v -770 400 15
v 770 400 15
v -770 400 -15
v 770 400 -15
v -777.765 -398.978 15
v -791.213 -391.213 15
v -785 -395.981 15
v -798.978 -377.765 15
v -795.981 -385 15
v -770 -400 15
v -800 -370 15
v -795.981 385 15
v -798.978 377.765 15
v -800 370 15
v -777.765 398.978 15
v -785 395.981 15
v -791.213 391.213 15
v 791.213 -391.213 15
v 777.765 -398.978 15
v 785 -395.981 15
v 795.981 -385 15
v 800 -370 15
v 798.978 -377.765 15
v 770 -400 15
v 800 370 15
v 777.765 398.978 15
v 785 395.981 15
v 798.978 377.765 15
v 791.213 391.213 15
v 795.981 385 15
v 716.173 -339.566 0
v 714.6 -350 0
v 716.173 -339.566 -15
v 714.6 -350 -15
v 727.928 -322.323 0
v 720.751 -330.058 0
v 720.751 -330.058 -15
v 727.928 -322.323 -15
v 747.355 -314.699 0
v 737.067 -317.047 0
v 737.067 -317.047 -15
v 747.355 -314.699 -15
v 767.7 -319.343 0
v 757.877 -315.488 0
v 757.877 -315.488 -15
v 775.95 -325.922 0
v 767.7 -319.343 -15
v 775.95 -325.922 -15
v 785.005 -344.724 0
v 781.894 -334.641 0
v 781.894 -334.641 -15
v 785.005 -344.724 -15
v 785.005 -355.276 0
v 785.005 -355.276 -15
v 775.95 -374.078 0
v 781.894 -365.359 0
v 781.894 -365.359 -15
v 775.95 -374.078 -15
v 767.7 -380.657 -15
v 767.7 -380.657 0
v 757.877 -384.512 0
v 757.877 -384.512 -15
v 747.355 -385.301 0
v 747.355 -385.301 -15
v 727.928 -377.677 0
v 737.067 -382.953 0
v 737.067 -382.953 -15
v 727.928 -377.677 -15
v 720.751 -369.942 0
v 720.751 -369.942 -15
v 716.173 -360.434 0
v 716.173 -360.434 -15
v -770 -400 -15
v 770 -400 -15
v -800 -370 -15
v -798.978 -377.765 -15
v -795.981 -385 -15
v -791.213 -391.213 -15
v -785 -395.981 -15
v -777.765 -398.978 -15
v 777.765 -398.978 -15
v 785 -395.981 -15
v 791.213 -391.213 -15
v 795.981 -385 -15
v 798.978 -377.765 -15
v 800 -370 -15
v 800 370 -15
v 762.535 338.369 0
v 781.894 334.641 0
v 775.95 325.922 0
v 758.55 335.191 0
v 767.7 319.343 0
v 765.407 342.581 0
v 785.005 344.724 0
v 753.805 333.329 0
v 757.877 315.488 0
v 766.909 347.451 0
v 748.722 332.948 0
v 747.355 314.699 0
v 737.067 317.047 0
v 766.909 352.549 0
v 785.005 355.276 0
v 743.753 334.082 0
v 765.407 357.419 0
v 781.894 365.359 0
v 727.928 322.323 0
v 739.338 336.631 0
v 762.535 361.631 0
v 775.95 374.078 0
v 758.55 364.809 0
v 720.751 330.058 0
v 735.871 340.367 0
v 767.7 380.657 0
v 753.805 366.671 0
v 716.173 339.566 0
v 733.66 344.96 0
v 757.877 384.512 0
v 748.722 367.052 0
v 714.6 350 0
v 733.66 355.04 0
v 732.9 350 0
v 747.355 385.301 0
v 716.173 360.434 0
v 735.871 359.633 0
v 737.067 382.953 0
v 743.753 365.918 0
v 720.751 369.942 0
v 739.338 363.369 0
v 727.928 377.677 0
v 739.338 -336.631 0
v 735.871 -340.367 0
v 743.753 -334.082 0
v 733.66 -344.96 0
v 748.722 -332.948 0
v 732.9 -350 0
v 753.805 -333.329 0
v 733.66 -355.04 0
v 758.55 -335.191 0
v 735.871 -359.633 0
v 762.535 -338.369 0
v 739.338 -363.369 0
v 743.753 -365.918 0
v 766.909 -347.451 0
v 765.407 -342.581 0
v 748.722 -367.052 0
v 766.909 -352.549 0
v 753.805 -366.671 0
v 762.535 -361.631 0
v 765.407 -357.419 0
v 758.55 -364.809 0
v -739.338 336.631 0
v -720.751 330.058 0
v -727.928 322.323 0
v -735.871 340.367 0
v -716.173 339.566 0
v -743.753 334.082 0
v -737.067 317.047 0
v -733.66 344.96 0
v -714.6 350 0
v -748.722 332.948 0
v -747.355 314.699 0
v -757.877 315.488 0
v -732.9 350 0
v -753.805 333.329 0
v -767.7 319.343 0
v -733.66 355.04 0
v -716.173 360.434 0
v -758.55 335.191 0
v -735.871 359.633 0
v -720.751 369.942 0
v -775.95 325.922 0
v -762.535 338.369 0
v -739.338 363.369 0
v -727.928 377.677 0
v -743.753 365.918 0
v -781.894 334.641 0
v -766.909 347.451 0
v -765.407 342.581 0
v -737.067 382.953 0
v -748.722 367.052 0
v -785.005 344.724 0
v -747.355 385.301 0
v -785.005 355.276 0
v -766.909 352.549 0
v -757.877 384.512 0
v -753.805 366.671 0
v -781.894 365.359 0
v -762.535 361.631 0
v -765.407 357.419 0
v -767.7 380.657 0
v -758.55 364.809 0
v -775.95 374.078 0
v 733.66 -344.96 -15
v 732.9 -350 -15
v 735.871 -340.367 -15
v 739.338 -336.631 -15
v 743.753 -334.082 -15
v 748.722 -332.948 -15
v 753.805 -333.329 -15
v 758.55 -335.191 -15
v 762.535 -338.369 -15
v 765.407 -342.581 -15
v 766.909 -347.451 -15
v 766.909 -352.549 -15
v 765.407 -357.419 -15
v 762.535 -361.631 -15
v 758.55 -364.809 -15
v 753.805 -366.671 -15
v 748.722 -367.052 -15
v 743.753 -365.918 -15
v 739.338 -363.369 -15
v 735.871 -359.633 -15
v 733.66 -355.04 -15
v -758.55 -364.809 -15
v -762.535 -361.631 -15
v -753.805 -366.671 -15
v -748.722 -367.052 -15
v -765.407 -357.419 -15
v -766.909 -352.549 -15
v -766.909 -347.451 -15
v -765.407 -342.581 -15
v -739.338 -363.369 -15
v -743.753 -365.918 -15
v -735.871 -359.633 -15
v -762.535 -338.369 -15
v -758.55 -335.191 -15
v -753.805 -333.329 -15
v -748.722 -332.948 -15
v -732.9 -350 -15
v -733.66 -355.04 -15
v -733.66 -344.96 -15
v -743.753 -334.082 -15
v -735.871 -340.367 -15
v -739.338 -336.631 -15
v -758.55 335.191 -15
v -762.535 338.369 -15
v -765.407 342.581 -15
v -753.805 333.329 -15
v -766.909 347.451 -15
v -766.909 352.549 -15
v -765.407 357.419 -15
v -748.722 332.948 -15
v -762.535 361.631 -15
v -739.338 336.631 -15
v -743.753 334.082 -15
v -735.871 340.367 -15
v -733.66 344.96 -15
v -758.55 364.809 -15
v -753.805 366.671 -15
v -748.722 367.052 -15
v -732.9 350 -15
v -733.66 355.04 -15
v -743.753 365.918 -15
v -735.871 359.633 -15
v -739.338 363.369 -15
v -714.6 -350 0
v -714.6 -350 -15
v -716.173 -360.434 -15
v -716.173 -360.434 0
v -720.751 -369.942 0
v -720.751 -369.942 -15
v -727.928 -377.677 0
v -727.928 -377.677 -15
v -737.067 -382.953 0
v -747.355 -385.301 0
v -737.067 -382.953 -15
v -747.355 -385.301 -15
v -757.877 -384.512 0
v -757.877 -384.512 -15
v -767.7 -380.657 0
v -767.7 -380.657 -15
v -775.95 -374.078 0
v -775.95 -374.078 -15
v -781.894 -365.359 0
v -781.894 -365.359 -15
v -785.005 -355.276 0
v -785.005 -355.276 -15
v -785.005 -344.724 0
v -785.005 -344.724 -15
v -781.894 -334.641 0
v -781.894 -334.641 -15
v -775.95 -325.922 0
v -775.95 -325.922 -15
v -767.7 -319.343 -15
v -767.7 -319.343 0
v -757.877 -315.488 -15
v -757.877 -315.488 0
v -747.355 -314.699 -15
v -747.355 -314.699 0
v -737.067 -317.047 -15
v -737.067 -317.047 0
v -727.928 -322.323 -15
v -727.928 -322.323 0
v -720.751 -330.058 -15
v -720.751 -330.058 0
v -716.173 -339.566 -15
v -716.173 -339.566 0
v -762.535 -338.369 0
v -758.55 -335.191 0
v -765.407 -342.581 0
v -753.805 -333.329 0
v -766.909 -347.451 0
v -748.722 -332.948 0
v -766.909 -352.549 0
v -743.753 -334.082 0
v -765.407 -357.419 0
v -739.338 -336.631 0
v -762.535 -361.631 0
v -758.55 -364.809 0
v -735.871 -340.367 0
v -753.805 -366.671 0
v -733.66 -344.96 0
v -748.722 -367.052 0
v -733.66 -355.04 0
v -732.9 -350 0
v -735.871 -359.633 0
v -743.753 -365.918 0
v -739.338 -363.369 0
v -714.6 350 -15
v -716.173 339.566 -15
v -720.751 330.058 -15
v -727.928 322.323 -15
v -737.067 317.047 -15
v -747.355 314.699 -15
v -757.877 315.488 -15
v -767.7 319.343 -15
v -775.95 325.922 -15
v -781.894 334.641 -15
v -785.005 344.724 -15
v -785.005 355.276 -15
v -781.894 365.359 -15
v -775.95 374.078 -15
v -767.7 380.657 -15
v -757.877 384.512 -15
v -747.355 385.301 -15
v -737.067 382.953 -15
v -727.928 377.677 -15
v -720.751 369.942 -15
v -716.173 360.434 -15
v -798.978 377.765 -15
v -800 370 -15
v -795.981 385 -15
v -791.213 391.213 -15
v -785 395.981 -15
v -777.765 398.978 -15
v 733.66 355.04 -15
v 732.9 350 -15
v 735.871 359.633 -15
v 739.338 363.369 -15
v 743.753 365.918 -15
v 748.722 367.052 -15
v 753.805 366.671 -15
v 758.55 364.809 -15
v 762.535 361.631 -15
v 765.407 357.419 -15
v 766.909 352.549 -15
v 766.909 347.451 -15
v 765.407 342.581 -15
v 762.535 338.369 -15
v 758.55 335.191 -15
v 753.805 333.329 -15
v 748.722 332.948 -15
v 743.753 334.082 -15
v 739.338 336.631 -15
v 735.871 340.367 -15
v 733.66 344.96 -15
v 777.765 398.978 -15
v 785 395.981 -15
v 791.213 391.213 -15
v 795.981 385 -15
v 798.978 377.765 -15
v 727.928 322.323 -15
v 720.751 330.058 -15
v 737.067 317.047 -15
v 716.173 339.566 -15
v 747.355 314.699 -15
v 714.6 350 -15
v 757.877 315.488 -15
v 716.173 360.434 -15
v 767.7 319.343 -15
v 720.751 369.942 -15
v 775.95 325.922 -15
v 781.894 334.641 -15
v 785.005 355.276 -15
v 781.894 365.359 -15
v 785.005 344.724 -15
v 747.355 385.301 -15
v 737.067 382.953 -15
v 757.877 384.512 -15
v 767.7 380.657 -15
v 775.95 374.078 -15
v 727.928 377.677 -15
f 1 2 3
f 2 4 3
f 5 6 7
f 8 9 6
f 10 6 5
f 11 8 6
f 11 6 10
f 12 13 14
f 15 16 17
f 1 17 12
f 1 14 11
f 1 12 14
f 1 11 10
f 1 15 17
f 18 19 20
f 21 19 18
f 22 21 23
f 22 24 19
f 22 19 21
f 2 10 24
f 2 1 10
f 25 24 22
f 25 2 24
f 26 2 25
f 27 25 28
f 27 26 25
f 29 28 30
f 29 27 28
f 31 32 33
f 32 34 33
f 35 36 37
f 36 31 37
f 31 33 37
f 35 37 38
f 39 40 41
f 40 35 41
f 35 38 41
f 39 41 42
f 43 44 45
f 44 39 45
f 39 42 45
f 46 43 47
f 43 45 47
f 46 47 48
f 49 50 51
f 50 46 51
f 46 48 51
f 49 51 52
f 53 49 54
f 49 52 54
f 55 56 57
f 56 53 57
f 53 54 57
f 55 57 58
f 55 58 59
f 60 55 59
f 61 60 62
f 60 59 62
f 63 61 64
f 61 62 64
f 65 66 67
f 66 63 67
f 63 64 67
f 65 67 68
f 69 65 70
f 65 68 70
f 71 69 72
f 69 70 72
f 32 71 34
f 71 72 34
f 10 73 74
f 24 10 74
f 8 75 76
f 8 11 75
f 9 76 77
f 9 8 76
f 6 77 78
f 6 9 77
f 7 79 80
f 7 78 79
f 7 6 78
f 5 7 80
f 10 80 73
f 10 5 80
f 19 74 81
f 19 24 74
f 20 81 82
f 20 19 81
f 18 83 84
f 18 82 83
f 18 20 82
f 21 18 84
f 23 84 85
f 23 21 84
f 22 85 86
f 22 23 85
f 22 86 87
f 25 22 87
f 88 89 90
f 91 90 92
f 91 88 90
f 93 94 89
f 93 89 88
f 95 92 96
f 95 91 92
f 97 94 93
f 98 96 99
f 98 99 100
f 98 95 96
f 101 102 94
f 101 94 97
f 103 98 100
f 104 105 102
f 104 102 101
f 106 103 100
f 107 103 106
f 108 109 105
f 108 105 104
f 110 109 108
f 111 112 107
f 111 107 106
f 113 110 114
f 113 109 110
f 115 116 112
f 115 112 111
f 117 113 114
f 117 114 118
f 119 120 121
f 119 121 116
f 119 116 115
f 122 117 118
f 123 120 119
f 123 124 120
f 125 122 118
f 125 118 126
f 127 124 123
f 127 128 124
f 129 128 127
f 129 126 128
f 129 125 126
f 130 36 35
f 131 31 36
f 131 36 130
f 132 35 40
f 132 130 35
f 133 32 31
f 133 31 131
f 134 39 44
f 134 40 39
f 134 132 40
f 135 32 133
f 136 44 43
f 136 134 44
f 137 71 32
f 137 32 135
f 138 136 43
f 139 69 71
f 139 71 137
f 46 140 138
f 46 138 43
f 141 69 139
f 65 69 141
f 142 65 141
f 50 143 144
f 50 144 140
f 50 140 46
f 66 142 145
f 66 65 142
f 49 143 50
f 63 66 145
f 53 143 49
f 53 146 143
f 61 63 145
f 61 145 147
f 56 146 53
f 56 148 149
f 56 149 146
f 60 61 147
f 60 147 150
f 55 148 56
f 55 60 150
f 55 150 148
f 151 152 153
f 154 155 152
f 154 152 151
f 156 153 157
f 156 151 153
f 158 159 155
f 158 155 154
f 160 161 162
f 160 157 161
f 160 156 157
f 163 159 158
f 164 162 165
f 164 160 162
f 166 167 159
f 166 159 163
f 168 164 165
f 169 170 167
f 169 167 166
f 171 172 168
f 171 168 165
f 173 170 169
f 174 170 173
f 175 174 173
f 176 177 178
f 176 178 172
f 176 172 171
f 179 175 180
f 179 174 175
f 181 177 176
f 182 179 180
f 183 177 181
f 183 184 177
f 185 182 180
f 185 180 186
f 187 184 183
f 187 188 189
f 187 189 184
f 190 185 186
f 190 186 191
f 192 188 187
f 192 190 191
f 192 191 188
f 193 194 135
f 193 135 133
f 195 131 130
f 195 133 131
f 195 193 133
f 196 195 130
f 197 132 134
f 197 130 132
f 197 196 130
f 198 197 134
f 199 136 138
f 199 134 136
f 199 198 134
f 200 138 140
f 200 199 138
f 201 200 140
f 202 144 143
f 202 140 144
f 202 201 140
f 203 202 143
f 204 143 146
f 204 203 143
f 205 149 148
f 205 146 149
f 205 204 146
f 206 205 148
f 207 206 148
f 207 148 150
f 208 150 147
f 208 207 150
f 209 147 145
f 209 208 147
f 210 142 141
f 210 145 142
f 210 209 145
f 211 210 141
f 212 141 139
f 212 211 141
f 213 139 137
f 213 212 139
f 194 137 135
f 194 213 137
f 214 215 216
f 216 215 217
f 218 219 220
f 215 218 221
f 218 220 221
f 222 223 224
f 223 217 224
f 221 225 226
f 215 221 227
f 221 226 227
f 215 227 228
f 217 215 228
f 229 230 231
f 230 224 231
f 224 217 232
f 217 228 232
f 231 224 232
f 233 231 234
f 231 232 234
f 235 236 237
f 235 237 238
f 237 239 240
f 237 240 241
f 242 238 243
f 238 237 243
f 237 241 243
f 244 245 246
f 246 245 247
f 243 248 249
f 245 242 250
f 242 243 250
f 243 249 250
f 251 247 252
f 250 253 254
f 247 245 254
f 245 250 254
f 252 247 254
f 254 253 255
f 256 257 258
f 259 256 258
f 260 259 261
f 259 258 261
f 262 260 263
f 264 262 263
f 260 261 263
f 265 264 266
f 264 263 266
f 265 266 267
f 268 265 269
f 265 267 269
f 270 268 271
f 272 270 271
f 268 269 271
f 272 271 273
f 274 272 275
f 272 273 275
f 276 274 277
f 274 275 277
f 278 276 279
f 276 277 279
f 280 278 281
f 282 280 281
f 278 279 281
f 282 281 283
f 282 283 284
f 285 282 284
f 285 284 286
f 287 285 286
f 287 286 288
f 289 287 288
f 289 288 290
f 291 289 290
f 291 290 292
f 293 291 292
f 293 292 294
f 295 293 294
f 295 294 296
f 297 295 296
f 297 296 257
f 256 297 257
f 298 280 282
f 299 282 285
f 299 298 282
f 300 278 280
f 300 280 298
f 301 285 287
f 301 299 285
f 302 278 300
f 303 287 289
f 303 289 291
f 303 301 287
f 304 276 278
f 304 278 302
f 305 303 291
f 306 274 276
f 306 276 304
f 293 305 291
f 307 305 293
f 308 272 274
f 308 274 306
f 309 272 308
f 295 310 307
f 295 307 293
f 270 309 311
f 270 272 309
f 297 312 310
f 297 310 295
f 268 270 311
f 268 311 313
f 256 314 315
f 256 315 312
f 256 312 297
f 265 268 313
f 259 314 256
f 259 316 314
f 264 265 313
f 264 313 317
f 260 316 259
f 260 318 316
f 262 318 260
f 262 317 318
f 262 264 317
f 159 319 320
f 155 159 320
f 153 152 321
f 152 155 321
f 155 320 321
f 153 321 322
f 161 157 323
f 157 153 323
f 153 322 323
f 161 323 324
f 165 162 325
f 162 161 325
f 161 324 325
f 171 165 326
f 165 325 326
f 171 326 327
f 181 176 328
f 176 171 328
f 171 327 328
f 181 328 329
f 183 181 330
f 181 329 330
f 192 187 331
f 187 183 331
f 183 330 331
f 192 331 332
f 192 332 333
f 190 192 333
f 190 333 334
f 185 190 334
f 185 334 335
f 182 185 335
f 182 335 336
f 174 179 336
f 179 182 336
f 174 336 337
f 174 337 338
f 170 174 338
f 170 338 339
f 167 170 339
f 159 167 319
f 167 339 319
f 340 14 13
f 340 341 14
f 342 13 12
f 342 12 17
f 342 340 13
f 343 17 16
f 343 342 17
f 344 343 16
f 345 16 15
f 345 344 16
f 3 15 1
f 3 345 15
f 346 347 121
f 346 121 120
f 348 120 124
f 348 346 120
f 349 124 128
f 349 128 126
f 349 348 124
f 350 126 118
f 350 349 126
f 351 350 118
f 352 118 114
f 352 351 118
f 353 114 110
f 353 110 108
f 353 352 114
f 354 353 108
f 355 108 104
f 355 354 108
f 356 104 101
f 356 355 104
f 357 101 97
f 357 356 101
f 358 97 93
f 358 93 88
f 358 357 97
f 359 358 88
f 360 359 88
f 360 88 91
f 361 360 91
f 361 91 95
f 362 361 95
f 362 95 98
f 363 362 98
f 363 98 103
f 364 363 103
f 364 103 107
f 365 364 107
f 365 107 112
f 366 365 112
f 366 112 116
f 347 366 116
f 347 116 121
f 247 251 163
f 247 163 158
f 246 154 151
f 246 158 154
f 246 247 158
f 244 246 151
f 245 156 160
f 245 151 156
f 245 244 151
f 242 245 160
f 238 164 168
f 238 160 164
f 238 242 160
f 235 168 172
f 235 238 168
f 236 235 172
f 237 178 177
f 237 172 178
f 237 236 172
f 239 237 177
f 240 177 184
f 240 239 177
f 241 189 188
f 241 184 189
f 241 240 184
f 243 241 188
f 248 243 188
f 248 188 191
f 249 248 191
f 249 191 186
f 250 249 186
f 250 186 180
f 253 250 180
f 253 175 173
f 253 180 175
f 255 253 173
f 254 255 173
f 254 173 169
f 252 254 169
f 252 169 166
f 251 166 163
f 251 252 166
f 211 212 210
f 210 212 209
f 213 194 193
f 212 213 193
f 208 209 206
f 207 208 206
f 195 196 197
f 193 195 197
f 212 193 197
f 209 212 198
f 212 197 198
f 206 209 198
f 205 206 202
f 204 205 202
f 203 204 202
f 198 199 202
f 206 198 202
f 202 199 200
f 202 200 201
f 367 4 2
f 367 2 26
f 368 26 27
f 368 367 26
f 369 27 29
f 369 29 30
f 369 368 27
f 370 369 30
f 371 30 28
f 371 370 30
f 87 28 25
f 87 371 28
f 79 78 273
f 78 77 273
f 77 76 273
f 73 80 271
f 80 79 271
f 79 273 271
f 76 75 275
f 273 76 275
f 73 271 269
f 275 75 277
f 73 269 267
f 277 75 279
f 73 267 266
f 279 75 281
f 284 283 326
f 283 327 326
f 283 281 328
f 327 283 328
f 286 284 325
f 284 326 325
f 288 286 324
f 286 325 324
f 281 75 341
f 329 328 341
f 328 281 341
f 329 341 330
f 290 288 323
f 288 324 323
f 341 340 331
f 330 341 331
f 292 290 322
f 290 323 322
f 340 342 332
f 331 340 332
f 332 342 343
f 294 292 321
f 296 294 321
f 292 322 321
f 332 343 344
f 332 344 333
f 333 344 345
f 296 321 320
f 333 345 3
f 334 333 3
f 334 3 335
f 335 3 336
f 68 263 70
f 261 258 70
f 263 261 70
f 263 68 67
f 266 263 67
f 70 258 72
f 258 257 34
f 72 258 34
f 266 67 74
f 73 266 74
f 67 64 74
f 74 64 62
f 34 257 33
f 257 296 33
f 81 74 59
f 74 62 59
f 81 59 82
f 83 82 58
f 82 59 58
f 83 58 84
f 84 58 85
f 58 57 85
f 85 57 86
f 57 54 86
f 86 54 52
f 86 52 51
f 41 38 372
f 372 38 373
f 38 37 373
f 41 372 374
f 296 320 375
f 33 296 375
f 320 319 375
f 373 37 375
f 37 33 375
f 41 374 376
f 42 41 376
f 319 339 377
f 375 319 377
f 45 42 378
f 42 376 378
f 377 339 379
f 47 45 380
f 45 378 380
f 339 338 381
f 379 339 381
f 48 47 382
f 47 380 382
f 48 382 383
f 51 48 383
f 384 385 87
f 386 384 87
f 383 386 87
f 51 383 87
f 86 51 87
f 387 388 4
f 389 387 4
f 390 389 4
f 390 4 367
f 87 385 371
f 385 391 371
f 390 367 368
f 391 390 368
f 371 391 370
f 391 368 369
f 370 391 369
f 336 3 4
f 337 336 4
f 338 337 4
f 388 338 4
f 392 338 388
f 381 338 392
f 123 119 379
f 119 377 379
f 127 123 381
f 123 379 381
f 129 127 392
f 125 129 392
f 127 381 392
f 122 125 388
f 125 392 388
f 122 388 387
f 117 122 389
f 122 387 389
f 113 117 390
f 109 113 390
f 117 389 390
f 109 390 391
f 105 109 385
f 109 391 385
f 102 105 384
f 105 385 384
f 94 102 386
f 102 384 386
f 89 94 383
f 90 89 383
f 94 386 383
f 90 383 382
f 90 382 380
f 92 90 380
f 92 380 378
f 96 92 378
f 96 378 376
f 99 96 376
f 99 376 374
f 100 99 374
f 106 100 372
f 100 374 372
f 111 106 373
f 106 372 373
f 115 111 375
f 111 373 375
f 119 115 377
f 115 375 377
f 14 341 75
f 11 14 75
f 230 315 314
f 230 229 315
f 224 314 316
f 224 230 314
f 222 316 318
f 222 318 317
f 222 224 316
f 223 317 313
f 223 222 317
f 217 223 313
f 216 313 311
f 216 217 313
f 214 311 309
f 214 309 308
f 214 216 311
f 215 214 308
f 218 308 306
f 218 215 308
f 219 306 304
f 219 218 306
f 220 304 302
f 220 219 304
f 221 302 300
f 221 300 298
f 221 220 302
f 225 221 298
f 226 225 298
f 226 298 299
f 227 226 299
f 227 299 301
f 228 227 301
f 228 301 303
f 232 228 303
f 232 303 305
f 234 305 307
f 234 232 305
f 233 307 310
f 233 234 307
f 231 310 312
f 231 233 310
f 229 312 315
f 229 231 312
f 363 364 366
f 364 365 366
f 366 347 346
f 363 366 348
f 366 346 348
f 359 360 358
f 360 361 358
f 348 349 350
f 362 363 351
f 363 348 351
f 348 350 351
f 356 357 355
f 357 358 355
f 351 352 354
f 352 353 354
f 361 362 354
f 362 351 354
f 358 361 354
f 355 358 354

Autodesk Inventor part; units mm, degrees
sketch "Esboço1" plane through (0, 0, 0) normal (0, 0, 1) x (1, 0, 0)
  line L0 (-800, -400) -> (800, -400)
  line L1 (800, -400) -> (800, 400)
  line L2 (800, 400) -> (-800, 400)
  line L3 (-800, 400) -> (-800, -400)
  line L4 (-800, -400) -> (800, 400) construction
  line L5 (800, -400) -> (-800, 400) construction
  point P0 (0, 0)
  dimension "d0" = 1600
  dimension "d1" = 800
extrude "Extrusão1" add sketch "Esboço1" along normal mid plane 30
fillet "Arredondamento1" radius 30 1 edges at (-800, 400, 0)
fillet "Arredondamento2" radius 30 1 edges at (800, 400, 0)
fillet "Arredondamento3" radius 30 1 edges at (800, -400, 0)
fillet "Arredondamento4" radius 30 1 edges at (-800, -400, 0)
sketch "Esboço3" plane through (0, 0, -15) normal (0, 0, -1) x (-1, 0, 0)
  circle A0 centre (-750, 350) radius 35.4
  circle A1 centre (-750, 350) radius 17.1
  point P0 (0, 0)
  dimension "d9" = 70.8
  dimension "d10" = 350
  dimension "d11" = 750
  dimension "d13" = 34.2
extrude "Extrusão2" cut sketch "Esboço3" against normal blind 15
mirror "Espelhar1" about plane through (0, 0, 0) normal (1, 0, 0) of "Extrusão2"
mirror "Espelhar2" about plane through (0, 0, 0) normal (0, 1, 0) of "Extrusão2", "Espelhar1"
properties part number "Sessao7_02_04_2025_999_0001" material "Madeira (Cerejeira)"
